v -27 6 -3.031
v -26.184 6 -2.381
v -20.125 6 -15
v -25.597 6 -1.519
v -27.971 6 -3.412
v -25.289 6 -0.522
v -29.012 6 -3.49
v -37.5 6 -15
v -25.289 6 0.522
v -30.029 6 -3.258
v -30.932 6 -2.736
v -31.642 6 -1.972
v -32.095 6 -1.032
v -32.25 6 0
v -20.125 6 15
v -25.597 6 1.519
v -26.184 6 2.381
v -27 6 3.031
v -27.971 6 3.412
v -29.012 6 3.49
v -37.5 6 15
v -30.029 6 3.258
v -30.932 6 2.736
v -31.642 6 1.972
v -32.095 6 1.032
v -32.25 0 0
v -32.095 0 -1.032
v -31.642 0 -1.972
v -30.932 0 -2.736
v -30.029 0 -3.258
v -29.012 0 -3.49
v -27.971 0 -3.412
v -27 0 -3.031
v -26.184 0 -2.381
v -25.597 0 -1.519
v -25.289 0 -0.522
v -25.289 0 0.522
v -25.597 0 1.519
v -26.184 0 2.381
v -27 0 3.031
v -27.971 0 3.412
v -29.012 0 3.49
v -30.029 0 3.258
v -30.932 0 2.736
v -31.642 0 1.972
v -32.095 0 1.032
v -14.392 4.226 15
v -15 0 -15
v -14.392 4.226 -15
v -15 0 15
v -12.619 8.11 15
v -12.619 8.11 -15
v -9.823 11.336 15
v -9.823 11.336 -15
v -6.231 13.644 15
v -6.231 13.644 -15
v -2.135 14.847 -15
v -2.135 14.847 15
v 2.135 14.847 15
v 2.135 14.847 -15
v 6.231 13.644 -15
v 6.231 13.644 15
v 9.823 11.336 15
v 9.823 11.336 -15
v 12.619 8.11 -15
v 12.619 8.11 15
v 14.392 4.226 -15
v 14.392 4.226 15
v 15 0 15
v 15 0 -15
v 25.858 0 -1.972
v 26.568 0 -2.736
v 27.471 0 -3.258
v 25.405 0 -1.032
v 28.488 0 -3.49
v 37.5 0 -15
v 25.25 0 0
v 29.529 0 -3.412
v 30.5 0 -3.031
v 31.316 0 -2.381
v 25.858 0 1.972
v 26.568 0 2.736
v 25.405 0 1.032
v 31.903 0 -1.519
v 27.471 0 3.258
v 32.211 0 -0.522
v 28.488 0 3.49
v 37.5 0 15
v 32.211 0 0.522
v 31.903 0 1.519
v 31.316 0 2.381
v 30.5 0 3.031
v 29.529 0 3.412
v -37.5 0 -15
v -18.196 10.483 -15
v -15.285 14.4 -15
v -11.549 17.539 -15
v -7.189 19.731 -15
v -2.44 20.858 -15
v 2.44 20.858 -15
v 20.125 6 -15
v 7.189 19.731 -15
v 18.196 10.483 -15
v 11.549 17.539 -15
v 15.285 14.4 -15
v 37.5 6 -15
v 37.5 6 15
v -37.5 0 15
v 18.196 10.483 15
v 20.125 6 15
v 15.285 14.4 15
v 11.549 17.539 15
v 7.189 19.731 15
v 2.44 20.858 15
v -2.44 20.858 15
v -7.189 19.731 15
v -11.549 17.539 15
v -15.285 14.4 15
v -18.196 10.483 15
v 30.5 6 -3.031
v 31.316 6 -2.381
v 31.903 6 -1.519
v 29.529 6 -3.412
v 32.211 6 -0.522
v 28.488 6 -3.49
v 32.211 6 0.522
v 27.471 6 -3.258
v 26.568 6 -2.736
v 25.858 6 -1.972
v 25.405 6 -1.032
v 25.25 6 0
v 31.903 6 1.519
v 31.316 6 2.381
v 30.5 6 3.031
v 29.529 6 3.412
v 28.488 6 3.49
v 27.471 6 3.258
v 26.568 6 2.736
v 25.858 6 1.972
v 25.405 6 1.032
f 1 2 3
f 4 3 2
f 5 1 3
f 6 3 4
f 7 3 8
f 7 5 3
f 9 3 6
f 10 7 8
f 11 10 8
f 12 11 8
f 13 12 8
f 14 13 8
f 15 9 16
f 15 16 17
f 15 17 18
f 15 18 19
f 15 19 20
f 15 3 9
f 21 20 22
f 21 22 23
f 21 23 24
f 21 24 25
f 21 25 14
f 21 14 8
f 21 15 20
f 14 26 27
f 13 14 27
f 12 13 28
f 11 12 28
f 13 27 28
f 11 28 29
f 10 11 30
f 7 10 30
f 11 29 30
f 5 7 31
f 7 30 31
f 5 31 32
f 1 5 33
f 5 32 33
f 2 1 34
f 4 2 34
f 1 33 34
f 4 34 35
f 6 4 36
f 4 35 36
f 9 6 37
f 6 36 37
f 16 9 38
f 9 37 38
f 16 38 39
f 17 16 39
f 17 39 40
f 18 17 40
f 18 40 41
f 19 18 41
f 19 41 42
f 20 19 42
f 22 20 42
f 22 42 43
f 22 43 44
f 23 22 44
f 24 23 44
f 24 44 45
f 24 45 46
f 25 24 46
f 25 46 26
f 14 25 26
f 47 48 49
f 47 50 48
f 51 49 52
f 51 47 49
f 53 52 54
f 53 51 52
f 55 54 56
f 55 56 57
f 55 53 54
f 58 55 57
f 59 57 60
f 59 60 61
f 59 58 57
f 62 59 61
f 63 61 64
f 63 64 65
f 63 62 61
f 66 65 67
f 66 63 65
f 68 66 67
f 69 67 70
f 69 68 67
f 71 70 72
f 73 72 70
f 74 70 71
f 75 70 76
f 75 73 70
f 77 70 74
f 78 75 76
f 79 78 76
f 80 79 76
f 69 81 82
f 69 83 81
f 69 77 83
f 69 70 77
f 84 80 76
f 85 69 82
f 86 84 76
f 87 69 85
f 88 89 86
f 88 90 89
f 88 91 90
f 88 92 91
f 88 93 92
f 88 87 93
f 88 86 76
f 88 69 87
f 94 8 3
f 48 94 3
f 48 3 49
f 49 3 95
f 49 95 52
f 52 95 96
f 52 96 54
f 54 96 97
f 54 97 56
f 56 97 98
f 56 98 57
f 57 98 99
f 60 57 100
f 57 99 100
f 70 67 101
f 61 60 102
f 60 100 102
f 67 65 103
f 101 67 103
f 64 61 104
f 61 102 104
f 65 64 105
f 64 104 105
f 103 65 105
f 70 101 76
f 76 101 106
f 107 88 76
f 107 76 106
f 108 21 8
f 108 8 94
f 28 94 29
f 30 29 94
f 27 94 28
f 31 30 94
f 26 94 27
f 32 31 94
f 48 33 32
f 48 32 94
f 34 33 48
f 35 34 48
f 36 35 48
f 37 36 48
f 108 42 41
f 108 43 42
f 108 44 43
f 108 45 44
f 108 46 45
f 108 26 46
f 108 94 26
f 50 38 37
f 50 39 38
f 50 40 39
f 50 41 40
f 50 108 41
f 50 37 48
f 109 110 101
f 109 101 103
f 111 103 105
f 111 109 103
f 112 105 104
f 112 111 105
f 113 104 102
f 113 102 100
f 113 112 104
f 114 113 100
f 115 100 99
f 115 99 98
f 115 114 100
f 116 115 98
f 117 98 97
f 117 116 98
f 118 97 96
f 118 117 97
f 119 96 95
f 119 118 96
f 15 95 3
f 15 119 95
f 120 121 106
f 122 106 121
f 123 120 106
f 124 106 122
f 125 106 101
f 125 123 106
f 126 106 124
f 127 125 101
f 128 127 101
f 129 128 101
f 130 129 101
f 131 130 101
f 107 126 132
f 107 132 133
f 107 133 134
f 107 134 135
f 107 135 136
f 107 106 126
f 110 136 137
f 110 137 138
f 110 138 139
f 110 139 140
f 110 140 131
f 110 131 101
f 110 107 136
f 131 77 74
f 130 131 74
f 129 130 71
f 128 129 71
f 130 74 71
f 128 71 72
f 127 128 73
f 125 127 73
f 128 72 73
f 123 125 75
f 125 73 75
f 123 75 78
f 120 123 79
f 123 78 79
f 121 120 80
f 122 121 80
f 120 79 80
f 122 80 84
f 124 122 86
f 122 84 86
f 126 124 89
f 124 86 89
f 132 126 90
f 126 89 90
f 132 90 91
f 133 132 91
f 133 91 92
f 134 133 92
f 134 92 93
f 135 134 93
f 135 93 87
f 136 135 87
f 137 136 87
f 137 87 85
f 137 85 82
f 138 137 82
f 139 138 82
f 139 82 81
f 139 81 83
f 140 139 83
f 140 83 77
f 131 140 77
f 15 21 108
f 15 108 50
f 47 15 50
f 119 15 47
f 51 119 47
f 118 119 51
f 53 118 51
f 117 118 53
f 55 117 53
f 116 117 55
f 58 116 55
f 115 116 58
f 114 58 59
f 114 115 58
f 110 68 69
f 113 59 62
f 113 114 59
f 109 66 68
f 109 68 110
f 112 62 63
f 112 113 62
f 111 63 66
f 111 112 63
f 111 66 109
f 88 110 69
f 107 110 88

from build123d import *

# Parameters (mm, degrees)
RESSALTO_EXTRUS_O1_DEPTH   = 15
FURO_DE_DI_METRO_7_0_7_1_D = 7


with BuildPart() as part:
    # Esboço1 → Ressalto-extrusão1 (new body, symmetric)
    with BuildSketch(Plane.XY):
        with BuildLine():
            Line((15, 0), (37.5, 0))
            Line((37.5, 0), (37.5, 6))
            Line((37.5, 6), (20.124611797, 6))
            ThreePointArc((20.124611797, 6), (0, 21), (-20.124611797, 6))
            Line((-20.124611797, 6), (-37.5, 6))
            Line((-37.5, 6), (-37.5, 0))
            Line((-37.5, 0), (-15, 0))
            ThreePointArc((-15, 0), (0, 15), (15, 0))
        make_face()
    extrude(amount=RESSALTO_EXTRUS_O1_DEPTH, both=True)

    # Furo de diâmetro Ø7.0 (7)1 (through all)
    with Locations(Plane(origin=(0, 6, 0), x_dir=(1, 0, 0), z_dir=(0, 1, 0))):
        with Locations((-28.75, 0), (28.75, 0)):
            Hole(FURO_DE_DI_METRO_7_0_7_1_D / 2)


solid = part.part
